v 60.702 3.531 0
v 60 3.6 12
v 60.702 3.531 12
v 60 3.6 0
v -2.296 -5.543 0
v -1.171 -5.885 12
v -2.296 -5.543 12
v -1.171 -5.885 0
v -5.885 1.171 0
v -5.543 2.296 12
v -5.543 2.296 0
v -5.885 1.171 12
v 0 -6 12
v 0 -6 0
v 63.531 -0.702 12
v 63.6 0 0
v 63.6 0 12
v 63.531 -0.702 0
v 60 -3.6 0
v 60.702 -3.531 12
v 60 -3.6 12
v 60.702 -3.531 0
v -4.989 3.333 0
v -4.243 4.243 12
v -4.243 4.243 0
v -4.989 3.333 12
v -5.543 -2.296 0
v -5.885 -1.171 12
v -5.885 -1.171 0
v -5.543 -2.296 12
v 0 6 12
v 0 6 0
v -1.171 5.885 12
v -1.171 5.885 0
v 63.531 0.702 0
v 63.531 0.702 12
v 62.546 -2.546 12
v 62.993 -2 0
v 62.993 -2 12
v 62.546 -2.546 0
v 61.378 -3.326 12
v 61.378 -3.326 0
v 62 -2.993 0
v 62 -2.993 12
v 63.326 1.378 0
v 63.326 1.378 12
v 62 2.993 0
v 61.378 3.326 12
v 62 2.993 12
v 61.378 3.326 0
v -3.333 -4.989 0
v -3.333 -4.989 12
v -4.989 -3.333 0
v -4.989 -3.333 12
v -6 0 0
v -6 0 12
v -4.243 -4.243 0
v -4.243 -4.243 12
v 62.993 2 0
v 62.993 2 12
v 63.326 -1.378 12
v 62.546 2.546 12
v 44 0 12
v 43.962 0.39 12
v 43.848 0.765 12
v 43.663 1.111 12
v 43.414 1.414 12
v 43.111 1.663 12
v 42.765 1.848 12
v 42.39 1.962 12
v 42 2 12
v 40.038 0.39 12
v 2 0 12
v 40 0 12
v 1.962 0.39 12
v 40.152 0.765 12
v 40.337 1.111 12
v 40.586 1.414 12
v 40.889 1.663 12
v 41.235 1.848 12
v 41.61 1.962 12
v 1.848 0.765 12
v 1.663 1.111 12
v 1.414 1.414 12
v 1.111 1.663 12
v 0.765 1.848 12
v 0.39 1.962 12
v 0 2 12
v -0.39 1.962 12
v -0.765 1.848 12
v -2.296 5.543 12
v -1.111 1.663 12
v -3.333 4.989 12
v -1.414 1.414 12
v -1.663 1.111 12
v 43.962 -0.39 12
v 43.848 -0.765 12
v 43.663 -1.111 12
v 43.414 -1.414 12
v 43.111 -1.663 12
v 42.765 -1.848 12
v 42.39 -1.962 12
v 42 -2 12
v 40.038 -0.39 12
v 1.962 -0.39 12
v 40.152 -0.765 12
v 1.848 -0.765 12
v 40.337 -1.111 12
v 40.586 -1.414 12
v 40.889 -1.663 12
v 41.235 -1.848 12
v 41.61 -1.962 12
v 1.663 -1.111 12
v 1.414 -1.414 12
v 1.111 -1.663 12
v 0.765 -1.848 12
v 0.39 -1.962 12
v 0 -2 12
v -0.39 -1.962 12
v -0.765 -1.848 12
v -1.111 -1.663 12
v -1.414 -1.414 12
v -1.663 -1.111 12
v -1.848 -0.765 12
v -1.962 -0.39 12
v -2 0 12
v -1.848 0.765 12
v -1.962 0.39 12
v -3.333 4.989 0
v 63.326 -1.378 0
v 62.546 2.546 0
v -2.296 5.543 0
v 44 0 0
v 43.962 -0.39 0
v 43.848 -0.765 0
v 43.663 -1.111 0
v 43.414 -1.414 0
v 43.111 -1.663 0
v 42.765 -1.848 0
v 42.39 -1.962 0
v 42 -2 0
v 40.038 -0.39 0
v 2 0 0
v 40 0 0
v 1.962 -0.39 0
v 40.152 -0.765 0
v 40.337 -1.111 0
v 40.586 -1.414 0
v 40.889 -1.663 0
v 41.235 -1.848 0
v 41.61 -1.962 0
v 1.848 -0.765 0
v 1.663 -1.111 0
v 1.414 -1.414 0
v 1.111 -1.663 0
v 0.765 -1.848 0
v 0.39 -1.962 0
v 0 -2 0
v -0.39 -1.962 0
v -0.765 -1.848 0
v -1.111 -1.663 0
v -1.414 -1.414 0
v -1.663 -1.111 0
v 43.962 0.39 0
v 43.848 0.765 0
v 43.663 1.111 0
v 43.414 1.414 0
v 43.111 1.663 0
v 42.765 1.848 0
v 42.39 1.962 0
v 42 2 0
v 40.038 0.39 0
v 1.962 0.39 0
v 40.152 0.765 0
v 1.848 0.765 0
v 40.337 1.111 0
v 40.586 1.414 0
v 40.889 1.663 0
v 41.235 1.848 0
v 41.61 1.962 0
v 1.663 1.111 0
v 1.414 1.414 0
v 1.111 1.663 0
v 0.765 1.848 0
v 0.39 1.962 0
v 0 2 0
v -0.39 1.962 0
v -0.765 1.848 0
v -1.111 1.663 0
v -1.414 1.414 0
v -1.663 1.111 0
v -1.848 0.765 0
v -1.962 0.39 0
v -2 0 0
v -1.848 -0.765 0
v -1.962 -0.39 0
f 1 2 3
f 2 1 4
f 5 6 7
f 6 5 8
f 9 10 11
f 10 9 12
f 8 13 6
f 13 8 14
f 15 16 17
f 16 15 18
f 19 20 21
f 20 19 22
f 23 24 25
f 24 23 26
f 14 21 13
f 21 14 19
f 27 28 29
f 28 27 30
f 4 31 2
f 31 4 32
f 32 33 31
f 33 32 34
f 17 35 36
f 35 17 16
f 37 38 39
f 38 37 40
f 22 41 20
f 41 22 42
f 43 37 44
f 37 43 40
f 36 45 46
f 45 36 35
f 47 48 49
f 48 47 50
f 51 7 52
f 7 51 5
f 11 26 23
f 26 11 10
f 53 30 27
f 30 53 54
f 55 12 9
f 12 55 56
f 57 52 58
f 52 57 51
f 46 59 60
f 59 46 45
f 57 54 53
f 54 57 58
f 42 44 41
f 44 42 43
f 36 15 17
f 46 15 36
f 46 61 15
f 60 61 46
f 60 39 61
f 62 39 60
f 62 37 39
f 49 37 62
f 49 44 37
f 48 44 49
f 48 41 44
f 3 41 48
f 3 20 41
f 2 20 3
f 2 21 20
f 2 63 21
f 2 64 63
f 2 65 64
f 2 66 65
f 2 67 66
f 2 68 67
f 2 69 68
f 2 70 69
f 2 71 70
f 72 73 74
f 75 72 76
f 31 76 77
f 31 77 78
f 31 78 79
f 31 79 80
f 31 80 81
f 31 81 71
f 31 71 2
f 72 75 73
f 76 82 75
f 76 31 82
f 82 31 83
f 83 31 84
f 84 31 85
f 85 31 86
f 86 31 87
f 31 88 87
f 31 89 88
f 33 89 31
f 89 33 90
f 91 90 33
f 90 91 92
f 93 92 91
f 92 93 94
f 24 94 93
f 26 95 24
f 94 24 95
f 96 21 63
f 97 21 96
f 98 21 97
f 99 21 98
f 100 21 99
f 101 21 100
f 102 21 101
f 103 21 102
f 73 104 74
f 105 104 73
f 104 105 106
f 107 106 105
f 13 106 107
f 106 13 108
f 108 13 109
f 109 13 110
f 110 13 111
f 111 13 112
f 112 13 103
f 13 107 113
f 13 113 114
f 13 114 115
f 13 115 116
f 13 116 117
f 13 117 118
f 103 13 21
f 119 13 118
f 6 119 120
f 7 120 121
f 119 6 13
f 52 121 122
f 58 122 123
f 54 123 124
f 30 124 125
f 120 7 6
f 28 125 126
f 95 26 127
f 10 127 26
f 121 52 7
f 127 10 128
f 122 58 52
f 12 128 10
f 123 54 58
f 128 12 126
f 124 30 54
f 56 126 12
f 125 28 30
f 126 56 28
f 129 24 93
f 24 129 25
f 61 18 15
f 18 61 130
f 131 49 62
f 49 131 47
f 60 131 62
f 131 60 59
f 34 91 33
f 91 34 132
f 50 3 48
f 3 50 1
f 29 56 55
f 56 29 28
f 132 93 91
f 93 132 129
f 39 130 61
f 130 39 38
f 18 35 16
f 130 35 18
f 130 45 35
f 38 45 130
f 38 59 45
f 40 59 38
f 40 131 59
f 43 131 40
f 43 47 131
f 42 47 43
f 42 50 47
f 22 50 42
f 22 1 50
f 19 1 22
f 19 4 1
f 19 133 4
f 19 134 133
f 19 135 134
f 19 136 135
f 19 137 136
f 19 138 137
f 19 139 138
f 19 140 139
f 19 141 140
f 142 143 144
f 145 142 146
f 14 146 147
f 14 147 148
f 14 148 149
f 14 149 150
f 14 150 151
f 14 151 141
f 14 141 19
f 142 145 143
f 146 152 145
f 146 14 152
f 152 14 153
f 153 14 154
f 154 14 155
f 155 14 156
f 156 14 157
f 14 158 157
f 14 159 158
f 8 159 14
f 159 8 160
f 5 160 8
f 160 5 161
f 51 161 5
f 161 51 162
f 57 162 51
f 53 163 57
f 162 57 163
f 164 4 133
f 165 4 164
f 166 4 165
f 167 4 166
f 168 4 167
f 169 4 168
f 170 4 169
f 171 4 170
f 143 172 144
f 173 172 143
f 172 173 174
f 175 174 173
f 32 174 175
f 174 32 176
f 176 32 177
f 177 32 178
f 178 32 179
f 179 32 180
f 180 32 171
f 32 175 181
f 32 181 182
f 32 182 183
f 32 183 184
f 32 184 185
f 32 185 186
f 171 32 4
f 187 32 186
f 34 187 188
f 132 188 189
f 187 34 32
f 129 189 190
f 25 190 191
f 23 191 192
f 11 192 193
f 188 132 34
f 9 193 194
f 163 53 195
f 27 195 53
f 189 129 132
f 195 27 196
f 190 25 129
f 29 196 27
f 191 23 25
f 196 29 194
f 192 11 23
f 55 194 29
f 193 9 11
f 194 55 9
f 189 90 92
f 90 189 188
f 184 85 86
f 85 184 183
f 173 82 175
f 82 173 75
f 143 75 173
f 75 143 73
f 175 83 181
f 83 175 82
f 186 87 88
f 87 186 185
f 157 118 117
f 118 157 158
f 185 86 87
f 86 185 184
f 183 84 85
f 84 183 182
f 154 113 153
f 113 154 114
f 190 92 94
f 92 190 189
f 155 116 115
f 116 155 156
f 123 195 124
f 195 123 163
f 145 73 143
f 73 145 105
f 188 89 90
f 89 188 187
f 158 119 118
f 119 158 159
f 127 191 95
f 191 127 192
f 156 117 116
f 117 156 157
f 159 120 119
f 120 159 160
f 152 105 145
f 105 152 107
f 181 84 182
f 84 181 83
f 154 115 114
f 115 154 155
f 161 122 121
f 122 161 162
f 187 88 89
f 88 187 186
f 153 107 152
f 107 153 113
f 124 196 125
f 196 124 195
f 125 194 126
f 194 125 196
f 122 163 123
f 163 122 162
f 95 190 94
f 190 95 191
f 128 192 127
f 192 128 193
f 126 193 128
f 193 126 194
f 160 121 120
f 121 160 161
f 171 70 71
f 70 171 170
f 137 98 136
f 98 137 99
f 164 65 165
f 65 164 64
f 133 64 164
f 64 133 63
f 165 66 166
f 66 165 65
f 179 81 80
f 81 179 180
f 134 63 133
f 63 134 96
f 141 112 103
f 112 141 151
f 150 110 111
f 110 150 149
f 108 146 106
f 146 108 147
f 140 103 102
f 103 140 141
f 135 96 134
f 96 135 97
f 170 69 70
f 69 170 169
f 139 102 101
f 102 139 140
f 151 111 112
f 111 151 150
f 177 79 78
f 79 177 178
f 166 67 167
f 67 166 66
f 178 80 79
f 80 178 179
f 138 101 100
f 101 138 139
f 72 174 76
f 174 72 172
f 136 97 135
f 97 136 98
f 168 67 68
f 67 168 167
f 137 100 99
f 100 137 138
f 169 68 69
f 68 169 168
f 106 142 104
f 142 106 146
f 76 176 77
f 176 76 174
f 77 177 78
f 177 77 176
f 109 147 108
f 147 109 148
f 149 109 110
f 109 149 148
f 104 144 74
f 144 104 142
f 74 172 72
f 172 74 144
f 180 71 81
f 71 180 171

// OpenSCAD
// QAV-250 Landing Skid — simple TPU skid (flexible)
// Print: TPU 95A 0.20mm (flex, absorbs landings)
// 4 skids per drone, ×3 = 12 skids
// Print: ~25 min per pair in TPU

/* [Skid Geometry] */
SKID_LEN = 60;          // mm length
SKID_DIA = 12;          // mm diameter (rounded)
HOLE_DIA = 4;            // mm M3 mount hole

$fn = 32;

module landing_skid() {
    hull() {
        cylinder(h=SKID_DIA, d=SKID_DIA);
        translate([SKID_LEN, 0, 0])
            cylinder(h=SKID_DIA, d=SKID_DIA * 0.6);
    }
}

difference() {
    landing_skid();
    translate([0, 0, -1])
        cylinder(h=SKID_DIA+2, d=HOLE_DIA);
    translate([SKID_LEN * 0.7, 0, -1])
        cylinder(h=SKID_DIA+2, d=HOLE_DIA);
}
